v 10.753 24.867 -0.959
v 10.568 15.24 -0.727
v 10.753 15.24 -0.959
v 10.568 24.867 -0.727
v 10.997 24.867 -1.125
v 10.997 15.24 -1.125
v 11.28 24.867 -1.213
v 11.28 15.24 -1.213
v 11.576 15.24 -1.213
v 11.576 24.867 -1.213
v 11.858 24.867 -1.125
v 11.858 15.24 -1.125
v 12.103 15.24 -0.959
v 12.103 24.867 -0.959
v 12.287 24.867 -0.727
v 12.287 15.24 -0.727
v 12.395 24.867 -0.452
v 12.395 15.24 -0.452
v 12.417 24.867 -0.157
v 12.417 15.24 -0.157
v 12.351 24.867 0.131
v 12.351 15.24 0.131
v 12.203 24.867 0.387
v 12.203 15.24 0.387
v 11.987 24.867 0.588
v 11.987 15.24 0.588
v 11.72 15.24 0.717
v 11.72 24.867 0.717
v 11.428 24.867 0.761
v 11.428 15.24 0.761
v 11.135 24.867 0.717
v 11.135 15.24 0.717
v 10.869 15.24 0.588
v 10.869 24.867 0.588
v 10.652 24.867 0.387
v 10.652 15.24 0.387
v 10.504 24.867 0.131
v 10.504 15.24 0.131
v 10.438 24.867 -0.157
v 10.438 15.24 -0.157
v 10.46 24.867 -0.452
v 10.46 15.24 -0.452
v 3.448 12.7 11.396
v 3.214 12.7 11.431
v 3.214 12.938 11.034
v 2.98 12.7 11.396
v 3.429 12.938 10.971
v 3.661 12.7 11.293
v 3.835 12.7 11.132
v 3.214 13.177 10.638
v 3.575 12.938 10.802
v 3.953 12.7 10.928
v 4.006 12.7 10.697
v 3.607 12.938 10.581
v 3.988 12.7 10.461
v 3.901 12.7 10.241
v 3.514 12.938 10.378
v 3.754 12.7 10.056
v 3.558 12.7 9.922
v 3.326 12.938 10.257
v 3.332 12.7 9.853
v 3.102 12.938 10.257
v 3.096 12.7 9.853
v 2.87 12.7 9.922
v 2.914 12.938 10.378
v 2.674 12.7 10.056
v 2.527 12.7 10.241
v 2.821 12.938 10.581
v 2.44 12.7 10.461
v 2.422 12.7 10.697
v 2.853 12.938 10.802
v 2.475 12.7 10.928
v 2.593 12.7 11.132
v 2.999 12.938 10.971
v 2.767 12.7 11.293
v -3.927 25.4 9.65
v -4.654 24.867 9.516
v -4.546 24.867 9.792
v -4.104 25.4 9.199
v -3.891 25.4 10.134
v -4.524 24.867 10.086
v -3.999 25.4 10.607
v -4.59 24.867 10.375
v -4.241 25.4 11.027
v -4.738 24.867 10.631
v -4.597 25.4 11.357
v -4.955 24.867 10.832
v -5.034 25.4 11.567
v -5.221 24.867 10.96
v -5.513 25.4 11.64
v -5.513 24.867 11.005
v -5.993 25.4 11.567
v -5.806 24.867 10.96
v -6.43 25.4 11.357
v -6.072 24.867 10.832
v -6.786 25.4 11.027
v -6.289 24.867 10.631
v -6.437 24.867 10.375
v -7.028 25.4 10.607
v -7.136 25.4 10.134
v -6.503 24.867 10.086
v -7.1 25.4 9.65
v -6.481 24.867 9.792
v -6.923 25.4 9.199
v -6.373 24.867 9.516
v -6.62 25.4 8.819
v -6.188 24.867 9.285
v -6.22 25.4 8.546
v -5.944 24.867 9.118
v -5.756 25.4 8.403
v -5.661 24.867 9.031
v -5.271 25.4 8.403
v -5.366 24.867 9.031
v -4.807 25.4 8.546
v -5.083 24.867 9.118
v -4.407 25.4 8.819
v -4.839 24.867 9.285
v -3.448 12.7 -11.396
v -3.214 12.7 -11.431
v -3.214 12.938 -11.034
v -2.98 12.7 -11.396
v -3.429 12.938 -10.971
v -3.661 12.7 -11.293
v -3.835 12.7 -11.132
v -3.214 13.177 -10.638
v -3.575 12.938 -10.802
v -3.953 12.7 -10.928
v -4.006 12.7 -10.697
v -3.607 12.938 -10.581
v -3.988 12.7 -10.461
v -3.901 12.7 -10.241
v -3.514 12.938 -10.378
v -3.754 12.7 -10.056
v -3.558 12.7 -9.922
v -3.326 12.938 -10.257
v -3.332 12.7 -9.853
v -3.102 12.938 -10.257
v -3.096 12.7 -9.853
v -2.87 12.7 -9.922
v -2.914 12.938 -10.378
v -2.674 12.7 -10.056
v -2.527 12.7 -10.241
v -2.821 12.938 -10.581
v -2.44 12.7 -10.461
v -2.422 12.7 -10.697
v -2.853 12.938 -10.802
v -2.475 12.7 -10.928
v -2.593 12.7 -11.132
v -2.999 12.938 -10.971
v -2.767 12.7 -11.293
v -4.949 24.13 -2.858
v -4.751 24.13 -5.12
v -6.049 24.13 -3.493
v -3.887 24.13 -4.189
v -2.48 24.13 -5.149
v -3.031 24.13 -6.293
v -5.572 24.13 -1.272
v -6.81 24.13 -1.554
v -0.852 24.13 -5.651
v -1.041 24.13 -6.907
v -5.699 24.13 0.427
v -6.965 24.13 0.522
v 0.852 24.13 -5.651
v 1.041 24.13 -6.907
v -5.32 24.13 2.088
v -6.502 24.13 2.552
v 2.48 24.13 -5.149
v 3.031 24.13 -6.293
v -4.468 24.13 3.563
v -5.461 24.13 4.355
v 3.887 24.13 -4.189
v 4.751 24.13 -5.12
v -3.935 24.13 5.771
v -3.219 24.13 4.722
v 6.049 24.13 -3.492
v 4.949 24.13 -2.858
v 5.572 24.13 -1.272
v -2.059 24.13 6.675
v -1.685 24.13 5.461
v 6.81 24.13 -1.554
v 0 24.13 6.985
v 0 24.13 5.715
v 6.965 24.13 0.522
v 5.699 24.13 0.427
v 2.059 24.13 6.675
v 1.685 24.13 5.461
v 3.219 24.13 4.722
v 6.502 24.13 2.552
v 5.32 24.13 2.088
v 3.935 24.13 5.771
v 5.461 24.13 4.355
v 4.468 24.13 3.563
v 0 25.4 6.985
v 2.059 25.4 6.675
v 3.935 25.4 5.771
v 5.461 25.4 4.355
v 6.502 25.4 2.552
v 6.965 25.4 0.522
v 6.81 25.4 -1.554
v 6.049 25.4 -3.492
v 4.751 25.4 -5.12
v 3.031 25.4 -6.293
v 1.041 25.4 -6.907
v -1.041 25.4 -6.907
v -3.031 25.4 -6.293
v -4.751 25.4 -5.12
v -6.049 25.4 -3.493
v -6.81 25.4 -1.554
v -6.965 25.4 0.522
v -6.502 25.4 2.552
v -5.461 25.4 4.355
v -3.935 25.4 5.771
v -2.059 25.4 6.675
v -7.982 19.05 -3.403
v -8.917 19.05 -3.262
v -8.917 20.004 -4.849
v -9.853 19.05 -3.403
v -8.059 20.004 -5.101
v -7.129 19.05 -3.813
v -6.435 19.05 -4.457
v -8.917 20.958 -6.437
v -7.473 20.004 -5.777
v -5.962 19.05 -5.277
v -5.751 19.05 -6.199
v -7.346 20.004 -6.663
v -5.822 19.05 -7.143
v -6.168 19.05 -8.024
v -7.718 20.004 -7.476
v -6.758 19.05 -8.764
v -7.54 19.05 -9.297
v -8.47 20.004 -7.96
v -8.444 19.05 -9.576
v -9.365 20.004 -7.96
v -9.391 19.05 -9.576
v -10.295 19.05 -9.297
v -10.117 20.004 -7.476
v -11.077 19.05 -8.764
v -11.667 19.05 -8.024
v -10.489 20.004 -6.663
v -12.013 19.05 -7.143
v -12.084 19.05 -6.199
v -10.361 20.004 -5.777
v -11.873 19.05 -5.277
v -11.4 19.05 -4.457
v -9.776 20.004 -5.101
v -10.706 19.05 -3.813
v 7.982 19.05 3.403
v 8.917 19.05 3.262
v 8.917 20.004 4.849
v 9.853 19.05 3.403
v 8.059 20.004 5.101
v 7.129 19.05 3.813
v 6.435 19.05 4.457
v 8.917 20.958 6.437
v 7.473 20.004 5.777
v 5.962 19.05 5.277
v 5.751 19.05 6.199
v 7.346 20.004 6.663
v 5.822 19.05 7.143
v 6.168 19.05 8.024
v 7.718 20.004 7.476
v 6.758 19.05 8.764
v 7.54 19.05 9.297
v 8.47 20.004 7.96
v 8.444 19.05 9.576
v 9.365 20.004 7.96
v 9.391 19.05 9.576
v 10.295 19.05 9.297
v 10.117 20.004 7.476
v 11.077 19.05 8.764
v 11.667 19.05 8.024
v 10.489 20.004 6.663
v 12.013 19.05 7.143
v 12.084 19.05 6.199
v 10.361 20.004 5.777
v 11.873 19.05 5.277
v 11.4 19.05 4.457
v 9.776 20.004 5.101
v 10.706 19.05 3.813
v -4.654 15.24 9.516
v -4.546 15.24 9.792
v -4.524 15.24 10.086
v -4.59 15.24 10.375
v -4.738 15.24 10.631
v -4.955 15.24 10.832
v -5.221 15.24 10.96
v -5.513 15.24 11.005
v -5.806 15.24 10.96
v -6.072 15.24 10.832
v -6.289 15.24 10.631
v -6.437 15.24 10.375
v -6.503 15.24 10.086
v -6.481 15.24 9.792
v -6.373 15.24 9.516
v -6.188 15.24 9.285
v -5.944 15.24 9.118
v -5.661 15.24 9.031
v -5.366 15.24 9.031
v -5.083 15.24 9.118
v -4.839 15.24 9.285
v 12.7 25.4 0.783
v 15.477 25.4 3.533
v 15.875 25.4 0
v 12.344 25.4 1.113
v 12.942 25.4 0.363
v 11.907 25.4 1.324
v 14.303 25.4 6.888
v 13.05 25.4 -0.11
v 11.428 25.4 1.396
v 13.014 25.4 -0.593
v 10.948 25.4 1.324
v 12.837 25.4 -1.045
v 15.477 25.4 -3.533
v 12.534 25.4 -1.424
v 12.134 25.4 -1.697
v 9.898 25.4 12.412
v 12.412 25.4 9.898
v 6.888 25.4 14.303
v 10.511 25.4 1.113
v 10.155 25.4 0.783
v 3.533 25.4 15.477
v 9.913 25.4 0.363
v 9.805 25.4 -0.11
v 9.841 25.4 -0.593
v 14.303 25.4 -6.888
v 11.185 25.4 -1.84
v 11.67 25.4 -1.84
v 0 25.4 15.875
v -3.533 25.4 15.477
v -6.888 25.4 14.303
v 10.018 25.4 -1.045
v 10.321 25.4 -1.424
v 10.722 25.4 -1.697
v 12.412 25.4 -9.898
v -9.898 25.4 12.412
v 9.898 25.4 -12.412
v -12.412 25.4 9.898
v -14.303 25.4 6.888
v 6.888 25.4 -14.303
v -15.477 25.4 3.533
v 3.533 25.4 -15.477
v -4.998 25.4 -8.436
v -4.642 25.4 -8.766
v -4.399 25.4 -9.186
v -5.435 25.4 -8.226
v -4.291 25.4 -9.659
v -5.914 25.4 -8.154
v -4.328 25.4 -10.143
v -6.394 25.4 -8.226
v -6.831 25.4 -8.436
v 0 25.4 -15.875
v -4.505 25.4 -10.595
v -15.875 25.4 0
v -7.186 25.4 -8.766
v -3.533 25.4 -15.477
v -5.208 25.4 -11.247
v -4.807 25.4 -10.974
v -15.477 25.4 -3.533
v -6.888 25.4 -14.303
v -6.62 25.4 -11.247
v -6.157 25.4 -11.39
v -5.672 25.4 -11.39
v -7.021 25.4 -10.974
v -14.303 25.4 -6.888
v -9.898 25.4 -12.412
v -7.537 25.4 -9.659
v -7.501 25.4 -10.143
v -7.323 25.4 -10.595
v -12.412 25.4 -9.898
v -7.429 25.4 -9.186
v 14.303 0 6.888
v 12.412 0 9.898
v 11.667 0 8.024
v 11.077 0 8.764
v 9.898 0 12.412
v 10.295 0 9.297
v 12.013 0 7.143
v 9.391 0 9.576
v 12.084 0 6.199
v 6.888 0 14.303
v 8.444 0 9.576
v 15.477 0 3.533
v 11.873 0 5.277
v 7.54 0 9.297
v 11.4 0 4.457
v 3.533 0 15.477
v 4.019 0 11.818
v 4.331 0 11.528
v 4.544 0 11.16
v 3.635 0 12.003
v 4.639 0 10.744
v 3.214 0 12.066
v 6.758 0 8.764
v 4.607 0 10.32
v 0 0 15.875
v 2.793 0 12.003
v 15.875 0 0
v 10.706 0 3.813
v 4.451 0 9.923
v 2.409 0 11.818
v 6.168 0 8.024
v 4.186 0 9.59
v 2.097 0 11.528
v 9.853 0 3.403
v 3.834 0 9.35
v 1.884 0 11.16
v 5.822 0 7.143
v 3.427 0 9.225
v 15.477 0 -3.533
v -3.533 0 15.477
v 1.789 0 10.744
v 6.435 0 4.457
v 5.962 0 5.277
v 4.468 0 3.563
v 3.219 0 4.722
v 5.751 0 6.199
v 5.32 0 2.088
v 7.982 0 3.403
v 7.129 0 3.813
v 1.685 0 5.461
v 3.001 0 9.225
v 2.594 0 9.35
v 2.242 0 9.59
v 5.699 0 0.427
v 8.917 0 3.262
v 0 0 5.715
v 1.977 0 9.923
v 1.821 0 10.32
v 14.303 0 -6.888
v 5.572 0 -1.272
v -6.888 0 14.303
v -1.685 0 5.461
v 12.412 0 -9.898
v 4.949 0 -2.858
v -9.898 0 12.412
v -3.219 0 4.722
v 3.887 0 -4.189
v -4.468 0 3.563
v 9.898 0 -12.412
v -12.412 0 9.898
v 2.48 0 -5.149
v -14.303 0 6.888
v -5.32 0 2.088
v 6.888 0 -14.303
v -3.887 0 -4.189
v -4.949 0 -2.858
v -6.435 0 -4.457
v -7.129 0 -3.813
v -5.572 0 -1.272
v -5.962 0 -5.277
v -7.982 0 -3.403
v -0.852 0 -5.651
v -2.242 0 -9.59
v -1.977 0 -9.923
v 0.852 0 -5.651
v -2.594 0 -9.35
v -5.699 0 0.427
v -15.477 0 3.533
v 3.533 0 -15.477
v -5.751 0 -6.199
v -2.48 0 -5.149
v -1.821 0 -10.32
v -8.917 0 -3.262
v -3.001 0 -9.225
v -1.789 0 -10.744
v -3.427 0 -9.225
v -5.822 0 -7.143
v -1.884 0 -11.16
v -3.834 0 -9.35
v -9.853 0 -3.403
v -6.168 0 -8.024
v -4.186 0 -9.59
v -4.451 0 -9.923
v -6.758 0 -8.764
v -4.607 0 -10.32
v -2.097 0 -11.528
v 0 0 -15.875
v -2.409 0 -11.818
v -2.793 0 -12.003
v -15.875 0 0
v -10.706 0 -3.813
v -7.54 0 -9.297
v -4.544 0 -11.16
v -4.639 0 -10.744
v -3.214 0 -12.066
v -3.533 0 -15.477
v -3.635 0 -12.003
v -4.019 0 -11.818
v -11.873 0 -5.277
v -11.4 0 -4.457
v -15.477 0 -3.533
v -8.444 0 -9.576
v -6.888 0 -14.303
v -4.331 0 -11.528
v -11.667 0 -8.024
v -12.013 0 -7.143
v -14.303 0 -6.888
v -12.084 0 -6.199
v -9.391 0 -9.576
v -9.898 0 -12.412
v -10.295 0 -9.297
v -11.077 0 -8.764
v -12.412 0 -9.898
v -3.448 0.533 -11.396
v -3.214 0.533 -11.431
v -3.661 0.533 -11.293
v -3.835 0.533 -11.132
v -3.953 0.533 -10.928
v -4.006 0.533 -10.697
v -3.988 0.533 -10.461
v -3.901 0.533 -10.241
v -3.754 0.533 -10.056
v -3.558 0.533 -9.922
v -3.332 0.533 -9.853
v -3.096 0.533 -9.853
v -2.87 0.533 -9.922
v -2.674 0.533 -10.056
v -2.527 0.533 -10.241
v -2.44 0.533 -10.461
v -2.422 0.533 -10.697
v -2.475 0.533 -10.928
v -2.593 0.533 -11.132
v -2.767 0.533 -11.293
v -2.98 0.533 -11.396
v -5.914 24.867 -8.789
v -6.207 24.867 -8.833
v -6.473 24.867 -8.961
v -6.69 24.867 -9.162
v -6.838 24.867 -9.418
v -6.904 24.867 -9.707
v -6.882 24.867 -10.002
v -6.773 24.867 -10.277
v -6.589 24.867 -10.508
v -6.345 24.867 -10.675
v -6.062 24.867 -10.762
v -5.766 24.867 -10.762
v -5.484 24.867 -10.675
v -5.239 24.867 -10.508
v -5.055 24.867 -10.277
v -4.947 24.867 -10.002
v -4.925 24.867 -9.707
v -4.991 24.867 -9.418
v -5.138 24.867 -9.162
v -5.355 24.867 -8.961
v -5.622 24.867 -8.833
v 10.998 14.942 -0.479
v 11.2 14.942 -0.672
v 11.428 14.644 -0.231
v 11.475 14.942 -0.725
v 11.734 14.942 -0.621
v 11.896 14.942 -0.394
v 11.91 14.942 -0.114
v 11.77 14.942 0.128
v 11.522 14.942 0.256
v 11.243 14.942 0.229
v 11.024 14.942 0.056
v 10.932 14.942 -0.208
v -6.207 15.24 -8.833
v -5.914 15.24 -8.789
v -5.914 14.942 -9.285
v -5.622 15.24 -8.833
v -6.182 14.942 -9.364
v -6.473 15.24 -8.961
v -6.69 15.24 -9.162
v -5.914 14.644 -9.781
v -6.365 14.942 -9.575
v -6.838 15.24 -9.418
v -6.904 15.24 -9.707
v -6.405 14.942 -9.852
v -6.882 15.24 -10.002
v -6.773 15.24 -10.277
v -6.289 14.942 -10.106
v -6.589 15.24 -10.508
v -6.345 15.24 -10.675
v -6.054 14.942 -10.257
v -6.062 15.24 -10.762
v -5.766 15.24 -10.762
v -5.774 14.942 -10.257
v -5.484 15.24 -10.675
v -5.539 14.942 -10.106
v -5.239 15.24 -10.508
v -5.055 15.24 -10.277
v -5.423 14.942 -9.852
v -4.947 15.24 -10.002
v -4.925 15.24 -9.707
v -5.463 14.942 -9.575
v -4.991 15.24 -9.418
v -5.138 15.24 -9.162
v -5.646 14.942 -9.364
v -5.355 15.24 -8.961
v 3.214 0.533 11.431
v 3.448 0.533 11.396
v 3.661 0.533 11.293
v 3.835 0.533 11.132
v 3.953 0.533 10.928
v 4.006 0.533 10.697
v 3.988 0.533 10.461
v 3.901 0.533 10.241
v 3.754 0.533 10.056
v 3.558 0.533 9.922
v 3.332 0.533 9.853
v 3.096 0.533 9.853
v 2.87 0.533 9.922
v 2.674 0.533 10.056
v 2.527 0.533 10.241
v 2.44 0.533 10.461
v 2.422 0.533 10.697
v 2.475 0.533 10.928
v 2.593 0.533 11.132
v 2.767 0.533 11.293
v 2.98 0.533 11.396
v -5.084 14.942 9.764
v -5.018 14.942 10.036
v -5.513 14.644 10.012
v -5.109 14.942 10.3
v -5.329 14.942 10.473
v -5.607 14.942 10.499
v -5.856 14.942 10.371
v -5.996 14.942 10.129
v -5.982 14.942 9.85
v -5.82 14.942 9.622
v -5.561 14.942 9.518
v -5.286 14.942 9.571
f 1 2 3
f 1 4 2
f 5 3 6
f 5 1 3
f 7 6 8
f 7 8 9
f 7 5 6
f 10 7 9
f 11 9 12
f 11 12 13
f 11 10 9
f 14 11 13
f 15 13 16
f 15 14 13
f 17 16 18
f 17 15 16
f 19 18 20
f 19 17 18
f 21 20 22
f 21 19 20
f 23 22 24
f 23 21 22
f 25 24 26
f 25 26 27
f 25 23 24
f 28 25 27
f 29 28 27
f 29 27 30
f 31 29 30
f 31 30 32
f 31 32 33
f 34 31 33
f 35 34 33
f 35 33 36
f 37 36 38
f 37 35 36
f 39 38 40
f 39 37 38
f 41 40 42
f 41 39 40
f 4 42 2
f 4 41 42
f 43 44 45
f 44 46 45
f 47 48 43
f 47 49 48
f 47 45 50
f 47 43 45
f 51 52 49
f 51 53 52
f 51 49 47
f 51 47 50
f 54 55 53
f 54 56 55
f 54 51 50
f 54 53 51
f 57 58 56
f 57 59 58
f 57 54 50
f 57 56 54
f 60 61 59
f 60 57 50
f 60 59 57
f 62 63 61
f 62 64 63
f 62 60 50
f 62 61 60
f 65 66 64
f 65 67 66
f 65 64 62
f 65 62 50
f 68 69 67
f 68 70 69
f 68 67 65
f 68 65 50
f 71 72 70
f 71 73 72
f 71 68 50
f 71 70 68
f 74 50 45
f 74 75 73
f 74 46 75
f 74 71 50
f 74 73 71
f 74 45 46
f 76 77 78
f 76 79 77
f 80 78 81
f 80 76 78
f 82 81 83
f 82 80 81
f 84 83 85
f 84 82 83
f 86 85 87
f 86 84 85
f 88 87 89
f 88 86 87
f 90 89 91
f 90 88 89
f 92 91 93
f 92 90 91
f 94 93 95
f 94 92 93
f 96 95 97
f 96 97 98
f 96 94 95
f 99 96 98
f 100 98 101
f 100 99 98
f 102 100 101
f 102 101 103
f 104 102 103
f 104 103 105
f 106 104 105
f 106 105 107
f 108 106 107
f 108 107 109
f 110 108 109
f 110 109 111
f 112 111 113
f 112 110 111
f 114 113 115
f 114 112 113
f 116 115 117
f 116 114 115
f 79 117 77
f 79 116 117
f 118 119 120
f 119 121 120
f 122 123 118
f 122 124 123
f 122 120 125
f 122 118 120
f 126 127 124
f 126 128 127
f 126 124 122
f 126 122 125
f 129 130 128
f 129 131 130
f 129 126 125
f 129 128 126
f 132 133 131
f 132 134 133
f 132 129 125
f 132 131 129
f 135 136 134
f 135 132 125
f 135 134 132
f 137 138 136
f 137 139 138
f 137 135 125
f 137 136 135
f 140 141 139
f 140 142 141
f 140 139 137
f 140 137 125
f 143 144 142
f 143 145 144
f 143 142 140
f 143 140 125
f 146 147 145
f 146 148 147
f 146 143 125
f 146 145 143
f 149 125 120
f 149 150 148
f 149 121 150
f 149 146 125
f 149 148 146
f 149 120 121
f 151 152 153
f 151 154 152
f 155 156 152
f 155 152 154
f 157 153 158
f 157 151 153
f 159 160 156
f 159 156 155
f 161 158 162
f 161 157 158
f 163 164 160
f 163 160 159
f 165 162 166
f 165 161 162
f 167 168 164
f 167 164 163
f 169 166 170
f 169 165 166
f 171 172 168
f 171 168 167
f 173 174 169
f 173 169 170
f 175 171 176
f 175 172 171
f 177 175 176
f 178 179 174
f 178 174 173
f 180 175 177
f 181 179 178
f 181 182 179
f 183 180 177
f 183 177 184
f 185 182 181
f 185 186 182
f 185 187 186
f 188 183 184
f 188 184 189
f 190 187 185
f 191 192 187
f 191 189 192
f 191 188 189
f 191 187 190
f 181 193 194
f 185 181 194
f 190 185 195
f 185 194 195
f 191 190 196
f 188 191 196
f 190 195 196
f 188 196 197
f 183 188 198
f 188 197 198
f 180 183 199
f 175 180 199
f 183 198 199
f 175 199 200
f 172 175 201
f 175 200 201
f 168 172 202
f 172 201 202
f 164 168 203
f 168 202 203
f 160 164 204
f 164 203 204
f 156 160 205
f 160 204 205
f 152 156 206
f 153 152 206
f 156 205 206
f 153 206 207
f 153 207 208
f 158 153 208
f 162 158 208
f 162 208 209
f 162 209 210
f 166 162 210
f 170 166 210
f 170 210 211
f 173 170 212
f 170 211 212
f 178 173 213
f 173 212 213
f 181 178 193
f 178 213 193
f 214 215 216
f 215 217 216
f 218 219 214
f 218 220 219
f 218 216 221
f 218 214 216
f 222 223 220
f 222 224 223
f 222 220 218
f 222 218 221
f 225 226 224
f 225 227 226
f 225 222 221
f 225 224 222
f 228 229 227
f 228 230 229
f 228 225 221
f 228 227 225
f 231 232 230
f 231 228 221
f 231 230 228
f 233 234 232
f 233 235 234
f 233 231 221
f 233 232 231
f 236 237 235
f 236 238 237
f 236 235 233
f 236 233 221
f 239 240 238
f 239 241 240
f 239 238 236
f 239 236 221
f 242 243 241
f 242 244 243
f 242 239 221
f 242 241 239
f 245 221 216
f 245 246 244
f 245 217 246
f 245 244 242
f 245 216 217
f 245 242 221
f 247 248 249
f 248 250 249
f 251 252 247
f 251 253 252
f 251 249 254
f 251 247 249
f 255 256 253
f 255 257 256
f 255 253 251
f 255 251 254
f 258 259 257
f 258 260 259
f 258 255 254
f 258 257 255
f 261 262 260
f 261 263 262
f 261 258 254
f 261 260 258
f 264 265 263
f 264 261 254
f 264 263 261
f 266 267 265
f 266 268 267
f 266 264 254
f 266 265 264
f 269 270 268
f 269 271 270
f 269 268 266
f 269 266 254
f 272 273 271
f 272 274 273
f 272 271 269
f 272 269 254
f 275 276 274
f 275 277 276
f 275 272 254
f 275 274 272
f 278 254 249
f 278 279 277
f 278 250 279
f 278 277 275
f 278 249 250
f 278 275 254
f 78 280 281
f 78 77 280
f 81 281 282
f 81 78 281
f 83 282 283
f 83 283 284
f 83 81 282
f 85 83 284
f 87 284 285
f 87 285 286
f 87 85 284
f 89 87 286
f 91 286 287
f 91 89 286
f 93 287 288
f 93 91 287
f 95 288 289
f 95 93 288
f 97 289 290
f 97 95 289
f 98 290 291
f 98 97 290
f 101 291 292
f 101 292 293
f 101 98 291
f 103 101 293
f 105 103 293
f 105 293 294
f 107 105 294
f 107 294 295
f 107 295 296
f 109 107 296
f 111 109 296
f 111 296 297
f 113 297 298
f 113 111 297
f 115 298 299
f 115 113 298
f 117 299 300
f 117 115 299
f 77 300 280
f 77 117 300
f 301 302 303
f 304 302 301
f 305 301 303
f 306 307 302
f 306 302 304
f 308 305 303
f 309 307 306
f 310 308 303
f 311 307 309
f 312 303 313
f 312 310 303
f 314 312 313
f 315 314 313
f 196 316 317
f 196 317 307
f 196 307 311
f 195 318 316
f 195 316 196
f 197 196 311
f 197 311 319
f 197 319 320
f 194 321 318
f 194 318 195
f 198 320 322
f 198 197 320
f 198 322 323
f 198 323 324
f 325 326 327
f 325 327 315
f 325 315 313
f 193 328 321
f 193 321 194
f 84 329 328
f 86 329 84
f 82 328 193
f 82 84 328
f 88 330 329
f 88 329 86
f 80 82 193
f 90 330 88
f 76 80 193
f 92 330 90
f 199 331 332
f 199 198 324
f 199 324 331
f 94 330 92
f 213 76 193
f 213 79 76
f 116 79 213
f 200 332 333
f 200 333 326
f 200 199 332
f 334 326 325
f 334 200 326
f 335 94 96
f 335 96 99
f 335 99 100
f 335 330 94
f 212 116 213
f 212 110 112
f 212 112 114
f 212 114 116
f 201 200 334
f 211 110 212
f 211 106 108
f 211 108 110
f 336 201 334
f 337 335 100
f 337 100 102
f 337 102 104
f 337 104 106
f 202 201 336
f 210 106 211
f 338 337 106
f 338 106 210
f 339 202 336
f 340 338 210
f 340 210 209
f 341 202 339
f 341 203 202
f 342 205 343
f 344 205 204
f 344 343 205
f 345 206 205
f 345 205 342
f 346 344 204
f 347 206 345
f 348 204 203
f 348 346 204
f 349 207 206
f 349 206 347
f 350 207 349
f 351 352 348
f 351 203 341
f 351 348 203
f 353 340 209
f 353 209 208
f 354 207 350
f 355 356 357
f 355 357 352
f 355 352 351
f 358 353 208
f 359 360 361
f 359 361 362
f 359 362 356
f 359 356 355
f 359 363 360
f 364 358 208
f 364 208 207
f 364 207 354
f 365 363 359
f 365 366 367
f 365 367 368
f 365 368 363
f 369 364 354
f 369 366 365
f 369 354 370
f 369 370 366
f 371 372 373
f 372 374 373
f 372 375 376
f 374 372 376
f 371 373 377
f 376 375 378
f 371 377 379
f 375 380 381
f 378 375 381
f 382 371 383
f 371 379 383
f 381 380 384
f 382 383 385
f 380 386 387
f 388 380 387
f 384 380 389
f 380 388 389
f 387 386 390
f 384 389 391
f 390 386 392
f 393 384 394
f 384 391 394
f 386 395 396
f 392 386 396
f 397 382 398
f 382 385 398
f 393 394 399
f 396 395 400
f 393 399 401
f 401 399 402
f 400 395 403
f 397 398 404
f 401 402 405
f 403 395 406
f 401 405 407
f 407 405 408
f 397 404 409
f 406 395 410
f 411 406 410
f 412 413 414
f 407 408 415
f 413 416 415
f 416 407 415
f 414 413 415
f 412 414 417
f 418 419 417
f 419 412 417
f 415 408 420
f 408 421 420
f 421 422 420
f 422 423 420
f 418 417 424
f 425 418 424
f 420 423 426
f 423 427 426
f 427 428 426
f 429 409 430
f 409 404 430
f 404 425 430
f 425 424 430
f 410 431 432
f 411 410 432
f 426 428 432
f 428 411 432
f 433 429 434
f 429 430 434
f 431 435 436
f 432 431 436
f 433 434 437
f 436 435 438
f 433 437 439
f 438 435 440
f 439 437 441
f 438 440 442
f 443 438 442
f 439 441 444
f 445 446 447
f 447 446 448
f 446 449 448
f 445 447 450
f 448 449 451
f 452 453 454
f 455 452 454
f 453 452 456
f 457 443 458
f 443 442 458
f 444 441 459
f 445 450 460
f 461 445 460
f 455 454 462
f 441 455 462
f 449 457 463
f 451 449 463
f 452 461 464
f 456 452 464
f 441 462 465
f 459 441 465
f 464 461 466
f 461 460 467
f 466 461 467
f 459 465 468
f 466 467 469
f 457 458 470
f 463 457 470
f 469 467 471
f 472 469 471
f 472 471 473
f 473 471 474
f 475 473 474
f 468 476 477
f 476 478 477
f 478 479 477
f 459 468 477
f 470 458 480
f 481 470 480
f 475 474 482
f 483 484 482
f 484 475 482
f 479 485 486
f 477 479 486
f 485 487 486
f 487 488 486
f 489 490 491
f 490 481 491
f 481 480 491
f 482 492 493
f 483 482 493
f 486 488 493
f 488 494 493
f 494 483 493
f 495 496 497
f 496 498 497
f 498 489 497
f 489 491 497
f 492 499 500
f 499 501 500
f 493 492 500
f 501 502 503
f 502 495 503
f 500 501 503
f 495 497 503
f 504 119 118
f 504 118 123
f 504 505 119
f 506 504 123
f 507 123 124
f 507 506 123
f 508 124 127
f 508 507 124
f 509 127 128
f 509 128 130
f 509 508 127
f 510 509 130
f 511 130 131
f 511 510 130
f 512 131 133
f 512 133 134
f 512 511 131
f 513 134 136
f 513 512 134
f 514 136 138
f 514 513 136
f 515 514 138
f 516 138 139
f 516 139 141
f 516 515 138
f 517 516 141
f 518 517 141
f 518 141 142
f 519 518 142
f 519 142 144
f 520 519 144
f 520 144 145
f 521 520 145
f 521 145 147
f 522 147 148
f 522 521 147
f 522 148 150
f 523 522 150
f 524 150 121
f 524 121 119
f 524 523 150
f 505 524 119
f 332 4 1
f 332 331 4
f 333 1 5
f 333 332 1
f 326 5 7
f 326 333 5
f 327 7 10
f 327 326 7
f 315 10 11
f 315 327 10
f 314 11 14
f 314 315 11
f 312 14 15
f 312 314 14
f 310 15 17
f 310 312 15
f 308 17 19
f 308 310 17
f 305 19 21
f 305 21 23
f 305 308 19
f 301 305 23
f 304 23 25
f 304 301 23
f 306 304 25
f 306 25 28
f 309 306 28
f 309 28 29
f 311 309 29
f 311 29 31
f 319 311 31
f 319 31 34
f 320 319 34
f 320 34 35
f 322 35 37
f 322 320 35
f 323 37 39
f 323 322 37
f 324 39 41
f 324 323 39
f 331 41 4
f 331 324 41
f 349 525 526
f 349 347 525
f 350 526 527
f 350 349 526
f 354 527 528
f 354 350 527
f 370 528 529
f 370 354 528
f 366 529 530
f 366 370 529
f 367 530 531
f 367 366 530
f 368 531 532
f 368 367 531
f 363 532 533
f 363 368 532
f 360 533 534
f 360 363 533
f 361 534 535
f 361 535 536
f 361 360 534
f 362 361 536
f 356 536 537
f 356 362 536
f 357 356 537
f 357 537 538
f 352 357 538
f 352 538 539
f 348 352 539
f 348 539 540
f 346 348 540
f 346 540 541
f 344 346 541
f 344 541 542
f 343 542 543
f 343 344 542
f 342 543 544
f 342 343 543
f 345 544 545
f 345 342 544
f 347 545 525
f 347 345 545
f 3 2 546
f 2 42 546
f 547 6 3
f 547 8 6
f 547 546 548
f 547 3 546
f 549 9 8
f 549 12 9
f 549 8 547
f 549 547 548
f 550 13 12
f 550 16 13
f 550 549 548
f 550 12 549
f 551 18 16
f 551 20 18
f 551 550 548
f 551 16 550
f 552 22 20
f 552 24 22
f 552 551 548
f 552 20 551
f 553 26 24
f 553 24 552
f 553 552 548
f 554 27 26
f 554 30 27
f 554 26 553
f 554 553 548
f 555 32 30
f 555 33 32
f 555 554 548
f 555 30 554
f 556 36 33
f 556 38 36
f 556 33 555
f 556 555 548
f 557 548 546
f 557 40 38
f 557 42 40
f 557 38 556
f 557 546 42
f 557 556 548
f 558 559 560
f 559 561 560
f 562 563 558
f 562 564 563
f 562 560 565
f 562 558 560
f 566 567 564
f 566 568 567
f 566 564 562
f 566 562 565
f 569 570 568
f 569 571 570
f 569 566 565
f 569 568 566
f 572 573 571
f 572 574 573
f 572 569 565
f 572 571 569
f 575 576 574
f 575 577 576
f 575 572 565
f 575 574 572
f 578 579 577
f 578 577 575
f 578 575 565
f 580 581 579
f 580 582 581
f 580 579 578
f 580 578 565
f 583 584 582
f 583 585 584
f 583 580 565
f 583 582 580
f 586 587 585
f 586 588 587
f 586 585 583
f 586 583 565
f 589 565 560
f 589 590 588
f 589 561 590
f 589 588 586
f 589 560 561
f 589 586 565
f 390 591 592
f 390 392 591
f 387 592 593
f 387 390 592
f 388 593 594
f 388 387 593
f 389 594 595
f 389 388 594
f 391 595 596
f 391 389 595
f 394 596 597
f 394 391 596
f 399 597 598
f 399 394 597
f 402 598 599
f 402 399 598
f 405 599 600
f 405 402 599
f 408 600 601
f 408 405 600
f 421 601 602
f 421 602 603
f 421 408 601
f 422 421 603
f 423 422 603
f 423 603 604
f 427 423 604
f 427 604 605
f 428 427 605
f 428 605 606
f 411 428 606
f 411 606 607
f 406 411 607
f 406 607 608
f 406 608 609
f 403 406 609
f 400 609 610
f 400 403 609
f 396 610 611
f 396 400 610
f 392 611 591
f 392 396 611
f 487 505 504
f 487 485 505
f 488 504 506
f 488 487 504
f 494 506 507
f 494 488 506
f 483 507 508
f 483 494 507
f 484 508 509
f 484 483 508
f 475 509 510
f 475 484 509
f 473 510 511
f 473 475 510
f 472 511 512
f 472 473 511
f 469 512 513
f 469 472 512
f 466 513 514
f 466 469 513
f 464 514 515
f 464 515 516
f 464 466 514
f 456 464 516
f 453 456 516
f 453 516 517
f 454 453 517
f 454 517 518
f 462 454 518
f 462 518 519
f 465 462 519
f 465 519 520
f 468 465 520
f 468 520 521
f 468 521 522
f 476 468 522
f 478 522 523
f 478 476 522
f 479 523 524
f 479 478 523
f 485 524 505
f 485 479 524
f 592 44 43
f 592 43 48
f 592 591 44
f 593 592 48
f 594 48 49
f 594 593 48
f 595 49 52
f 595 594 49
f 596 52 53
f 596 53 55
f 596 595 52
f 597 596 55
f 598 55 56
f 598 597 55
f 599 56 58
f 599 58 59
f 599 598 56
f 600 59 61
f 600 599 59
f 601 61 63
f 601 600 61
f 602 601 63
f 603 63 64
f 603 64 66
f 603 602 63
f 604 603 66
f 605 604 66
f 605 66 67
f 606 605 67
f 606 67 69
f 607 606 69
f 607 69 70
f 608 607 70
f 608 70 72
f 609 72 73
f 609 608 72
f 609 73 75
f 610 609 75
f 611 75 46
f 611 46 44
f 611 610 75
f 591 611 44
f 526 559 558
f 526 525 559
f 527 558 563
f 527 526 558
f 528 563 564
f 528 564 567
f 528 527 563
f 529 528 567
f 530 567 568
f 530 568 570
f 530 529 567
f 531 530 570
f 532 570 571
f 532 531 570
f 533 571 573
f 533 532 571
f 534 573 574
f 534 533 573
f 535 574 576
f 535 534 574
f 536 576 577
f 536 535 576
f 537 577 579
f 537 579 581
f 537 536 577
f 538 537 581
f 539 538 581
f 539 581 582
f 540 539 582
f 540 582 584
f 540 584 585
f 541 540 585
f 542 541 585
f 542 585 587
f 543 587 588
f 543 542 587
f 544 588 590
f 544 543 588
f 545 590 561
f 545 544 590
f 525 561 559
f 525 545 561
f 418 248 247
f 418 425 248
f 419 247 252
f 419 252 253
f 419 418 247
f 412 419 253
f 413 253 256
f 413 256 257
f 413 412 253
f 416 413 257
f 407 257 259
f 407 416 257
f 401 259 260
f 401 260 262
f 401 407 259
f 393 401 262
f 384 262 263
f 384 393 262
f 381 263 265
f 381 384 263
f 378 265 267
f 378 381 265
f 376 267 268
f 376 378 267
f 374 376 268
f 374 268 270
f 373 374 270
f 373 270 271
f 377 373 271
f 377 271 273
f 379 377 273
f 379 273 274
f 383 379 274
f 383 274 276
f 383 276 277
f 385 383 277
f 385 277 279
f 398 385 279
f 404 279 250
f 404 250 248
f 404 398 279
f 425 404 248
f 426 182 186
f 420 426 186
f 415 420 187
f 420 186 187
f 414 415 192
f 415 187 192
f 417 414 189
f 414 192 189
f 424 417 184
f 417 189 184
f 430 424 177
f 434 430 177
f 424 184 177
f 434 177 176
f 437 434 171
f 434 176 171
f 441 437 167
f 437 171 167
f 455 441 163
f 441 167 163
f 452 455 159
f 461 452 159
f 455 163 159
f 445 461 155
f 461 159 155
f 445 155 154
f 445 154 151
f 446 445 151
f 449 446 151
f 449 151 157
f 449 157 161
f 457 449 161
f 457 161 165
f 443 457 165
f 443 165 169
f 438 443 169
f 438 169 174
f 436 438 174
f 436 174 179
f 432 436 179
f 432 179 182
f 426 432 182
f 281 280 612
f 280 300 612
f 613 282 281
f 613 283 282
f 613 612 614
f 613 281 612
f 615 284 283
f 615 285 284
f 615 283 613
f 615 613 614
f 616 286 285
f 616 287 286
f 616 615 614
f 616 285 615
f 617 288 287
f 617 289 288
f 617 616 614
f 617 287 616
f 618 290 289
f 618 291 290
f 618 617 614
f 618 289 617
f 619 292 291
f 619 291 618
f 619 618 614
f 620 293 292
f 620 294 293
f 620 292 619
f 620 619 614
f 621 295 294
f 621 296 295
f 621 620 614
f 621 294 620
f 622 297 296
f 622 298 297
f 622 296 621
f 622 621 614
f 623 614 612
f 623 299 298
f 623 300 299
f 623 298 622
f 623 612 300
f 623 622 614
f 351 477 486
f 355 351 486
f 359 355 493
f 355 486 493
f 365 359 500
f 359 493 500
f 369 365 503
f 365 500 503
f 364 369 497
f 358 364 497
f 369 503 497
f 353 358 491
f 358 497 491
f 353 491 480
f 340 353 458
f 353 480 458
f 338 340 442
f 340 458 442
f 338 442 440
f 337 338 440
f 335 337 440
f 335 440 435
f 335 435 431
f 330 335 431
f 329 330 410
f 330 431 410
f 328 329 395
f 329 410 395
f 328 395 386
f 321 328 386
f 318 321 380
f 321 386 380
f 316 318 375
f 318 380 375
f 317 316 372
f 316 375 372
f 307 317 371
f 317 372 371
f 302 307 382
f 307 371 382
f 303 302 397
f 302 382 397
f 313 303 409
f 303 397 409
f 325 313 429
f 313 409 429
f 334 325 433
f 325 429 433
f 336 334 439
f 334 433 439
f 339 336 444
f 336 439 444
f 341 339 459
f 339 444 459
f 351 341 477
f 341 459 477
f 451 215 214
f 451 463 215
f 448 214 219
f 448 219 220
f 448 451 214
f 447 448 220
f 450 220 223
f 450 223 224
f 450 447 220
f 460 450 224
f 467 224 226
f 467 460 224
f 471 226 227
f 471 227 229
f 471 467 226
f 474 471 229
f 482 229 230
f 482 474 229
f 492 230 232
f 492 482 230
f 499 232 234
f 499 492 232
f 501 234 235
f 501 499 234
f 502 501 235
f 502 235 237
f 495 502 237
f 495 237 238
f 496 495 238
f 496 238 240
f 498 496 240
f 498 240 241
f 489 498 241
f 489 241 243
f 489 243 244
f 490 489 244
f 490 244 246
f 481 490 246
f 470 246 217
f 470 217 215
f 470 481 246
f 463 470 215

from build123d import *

# Parameters (mm, degrees)
SKETCH1_R           = 15.875
BOSS_EXTRUDE1_DEPTH = 25.4
SKETCH2_R           = 5.715
CUT_EXTRUDE1_DEPTH  = 34.89972345
SKETCH3_R           = 6.985
CUT_EXTRUDE2_DEPTH  = 1.27
CIRPATTERN3_COUNT   = 2
CIRPATTERN4_COUNT   = 3
CIRPATTERN5_COUNT   = 2


with BuildPart() as part:
    # Sketch1 → Boss-Extrude1 (new body)
    with BuildSketch(Plane(origin=(0, 0, 0), x_dir=(1, 0, 0), z_dir=(0, 1, 0))):
        with Locations(Location((0, 0, 0), (0, 0, 90))):
            Circle(SKETCH1_R)
    extrude(amount=BOSS_EXTRUDE1_DEPTH)

    # Sketch2 → Cut-Extrude1 (cut, through all)
    with BuildSketch(Plane(origin=(0, 25.4, 0), x_dir=(1, 0, 0), z_dir=(0, 1, 0))):
        with Locations(Location((0, 0, 0), (0, 0, 270))):
            Circle(SKETCH2_R)
    extrude(amount=-CUT_EXTRUDE1_DEPTH, mode=Mode.SUBTRACT)

    # Sketch3 → Cut-Extrude2 (cut)
    with BuildSketch(Plane(origin=(0, 25.4, 0), x_dir=(1, 0, 0), z_dir=(0, 1, 0))):
        with Locations(Location((0, 0, 0), (0, 0, 270))):
            Circle(SKETCH3_R)
    extrude(amount=-CUT_EXTRUDE2_DEPTH, mode=Mode.SUBTRACT)

    # Sketch10 → 1/4 (0.25) Diameter Hole2 (revolve, cut)
    with BuildSketch(Plane(origin=(8.917384444, 0, 6.43673099), x_dir=(0, 0, -1), z_dir=(1, 0, 0))):
        Polygon((0, 0), (0, 20.957732465), (3.175, 19.05), (3.175, 0), align=None)
    f_1_4_0_25_diameter_hole2 = revolve(axis=Axis((8.917384444, -6.35, 6.43673099), (0, 1, 0)), mode=Mode.SUBTRACT)

    # CirPattern3: 1/4 (0.25) Diameter Hole2 ×2 about axis
    cirpattern3_axis = Axis((0, 0, 0), (0, 1, 0))
    for i in range(1, CIRPATTERN3_COUNT):
        add(f_1_4_0_25_diameter_hole2.rotate(cirpattern3_axis, i * 360 / CIRPATTERN3_COUNT), mode=Mode.SUBTRACT)

    # Sketch13 → 5/64 (0.07813) Diameter Hole1 (revolve, cut)
    with BuildSketch(Plane(origin=(-5.914180419, 25.4, -9.780969787), x_dir=(0, 0, 1), z_dir=(1, 0, 0))):
        Polygon((0, 0), (0, 10.75620455), (0.992251, 10.16), (0.992251, 0.532828266), (1.627251, 0), align=None)
    f_5_64_0_07813_diameter_hole1 = revolve(axis=Axis((-5.914180419, 31.75, -9.780969787), (0, -1, 0)), mode=Mode.SUBTRACT)

    # CirPattern4: 5/64 (0.07813) Diameter Hole1 ×3 about axis
    cirpattern4_axis = Axis((0, 0, 0), (0, 1, 0))
    for i in range(1, CIRPATTERN4_COUNT):
        add(f_5_64_0_07813_diameter_hole1.rotate(cirpattern4_axis, i * 360 / CIRPATTERN4_COUNT), mode=Mode.SUBTRACT)

    # Sketch16 → 1/16 (0.0625) Diameter Hole1 (revolve, cut)
    with BuildSketch(Plane(origin=(-3.214022597, 0, -10.637561516), x_dir=(0, 0, -1), z_dir=(1, 0, 0))):
        Polygon((0, 0), (0, 13.176933116), (0.79375, 12.7), (0.79375, 0.532828266), (1.42875, 0), align=None)
    f_1_16_0_0625_diameter_hole1 = revolve(axis=Axis((-3.214022597, -6.35, -10.637561516), (0, 1, 0)), mode=Mode.SUBTRACT)

    # CirPattern5: 1/16 (0.0625) Diameter Hole1 ×2 about axis
    cirpattern5_axis = Axis((0, 0, 0), (0, 1, 0))
    for i in range(1, CIRPATTERN5_COUNT):
        add(f_1_16_0_0625_diameter_hole1.rotate(cirpattern5_axis, i * 360 / CIRPATTERN5_COUNT), mode=Mode.SUBTRACT)


solid = part.part
